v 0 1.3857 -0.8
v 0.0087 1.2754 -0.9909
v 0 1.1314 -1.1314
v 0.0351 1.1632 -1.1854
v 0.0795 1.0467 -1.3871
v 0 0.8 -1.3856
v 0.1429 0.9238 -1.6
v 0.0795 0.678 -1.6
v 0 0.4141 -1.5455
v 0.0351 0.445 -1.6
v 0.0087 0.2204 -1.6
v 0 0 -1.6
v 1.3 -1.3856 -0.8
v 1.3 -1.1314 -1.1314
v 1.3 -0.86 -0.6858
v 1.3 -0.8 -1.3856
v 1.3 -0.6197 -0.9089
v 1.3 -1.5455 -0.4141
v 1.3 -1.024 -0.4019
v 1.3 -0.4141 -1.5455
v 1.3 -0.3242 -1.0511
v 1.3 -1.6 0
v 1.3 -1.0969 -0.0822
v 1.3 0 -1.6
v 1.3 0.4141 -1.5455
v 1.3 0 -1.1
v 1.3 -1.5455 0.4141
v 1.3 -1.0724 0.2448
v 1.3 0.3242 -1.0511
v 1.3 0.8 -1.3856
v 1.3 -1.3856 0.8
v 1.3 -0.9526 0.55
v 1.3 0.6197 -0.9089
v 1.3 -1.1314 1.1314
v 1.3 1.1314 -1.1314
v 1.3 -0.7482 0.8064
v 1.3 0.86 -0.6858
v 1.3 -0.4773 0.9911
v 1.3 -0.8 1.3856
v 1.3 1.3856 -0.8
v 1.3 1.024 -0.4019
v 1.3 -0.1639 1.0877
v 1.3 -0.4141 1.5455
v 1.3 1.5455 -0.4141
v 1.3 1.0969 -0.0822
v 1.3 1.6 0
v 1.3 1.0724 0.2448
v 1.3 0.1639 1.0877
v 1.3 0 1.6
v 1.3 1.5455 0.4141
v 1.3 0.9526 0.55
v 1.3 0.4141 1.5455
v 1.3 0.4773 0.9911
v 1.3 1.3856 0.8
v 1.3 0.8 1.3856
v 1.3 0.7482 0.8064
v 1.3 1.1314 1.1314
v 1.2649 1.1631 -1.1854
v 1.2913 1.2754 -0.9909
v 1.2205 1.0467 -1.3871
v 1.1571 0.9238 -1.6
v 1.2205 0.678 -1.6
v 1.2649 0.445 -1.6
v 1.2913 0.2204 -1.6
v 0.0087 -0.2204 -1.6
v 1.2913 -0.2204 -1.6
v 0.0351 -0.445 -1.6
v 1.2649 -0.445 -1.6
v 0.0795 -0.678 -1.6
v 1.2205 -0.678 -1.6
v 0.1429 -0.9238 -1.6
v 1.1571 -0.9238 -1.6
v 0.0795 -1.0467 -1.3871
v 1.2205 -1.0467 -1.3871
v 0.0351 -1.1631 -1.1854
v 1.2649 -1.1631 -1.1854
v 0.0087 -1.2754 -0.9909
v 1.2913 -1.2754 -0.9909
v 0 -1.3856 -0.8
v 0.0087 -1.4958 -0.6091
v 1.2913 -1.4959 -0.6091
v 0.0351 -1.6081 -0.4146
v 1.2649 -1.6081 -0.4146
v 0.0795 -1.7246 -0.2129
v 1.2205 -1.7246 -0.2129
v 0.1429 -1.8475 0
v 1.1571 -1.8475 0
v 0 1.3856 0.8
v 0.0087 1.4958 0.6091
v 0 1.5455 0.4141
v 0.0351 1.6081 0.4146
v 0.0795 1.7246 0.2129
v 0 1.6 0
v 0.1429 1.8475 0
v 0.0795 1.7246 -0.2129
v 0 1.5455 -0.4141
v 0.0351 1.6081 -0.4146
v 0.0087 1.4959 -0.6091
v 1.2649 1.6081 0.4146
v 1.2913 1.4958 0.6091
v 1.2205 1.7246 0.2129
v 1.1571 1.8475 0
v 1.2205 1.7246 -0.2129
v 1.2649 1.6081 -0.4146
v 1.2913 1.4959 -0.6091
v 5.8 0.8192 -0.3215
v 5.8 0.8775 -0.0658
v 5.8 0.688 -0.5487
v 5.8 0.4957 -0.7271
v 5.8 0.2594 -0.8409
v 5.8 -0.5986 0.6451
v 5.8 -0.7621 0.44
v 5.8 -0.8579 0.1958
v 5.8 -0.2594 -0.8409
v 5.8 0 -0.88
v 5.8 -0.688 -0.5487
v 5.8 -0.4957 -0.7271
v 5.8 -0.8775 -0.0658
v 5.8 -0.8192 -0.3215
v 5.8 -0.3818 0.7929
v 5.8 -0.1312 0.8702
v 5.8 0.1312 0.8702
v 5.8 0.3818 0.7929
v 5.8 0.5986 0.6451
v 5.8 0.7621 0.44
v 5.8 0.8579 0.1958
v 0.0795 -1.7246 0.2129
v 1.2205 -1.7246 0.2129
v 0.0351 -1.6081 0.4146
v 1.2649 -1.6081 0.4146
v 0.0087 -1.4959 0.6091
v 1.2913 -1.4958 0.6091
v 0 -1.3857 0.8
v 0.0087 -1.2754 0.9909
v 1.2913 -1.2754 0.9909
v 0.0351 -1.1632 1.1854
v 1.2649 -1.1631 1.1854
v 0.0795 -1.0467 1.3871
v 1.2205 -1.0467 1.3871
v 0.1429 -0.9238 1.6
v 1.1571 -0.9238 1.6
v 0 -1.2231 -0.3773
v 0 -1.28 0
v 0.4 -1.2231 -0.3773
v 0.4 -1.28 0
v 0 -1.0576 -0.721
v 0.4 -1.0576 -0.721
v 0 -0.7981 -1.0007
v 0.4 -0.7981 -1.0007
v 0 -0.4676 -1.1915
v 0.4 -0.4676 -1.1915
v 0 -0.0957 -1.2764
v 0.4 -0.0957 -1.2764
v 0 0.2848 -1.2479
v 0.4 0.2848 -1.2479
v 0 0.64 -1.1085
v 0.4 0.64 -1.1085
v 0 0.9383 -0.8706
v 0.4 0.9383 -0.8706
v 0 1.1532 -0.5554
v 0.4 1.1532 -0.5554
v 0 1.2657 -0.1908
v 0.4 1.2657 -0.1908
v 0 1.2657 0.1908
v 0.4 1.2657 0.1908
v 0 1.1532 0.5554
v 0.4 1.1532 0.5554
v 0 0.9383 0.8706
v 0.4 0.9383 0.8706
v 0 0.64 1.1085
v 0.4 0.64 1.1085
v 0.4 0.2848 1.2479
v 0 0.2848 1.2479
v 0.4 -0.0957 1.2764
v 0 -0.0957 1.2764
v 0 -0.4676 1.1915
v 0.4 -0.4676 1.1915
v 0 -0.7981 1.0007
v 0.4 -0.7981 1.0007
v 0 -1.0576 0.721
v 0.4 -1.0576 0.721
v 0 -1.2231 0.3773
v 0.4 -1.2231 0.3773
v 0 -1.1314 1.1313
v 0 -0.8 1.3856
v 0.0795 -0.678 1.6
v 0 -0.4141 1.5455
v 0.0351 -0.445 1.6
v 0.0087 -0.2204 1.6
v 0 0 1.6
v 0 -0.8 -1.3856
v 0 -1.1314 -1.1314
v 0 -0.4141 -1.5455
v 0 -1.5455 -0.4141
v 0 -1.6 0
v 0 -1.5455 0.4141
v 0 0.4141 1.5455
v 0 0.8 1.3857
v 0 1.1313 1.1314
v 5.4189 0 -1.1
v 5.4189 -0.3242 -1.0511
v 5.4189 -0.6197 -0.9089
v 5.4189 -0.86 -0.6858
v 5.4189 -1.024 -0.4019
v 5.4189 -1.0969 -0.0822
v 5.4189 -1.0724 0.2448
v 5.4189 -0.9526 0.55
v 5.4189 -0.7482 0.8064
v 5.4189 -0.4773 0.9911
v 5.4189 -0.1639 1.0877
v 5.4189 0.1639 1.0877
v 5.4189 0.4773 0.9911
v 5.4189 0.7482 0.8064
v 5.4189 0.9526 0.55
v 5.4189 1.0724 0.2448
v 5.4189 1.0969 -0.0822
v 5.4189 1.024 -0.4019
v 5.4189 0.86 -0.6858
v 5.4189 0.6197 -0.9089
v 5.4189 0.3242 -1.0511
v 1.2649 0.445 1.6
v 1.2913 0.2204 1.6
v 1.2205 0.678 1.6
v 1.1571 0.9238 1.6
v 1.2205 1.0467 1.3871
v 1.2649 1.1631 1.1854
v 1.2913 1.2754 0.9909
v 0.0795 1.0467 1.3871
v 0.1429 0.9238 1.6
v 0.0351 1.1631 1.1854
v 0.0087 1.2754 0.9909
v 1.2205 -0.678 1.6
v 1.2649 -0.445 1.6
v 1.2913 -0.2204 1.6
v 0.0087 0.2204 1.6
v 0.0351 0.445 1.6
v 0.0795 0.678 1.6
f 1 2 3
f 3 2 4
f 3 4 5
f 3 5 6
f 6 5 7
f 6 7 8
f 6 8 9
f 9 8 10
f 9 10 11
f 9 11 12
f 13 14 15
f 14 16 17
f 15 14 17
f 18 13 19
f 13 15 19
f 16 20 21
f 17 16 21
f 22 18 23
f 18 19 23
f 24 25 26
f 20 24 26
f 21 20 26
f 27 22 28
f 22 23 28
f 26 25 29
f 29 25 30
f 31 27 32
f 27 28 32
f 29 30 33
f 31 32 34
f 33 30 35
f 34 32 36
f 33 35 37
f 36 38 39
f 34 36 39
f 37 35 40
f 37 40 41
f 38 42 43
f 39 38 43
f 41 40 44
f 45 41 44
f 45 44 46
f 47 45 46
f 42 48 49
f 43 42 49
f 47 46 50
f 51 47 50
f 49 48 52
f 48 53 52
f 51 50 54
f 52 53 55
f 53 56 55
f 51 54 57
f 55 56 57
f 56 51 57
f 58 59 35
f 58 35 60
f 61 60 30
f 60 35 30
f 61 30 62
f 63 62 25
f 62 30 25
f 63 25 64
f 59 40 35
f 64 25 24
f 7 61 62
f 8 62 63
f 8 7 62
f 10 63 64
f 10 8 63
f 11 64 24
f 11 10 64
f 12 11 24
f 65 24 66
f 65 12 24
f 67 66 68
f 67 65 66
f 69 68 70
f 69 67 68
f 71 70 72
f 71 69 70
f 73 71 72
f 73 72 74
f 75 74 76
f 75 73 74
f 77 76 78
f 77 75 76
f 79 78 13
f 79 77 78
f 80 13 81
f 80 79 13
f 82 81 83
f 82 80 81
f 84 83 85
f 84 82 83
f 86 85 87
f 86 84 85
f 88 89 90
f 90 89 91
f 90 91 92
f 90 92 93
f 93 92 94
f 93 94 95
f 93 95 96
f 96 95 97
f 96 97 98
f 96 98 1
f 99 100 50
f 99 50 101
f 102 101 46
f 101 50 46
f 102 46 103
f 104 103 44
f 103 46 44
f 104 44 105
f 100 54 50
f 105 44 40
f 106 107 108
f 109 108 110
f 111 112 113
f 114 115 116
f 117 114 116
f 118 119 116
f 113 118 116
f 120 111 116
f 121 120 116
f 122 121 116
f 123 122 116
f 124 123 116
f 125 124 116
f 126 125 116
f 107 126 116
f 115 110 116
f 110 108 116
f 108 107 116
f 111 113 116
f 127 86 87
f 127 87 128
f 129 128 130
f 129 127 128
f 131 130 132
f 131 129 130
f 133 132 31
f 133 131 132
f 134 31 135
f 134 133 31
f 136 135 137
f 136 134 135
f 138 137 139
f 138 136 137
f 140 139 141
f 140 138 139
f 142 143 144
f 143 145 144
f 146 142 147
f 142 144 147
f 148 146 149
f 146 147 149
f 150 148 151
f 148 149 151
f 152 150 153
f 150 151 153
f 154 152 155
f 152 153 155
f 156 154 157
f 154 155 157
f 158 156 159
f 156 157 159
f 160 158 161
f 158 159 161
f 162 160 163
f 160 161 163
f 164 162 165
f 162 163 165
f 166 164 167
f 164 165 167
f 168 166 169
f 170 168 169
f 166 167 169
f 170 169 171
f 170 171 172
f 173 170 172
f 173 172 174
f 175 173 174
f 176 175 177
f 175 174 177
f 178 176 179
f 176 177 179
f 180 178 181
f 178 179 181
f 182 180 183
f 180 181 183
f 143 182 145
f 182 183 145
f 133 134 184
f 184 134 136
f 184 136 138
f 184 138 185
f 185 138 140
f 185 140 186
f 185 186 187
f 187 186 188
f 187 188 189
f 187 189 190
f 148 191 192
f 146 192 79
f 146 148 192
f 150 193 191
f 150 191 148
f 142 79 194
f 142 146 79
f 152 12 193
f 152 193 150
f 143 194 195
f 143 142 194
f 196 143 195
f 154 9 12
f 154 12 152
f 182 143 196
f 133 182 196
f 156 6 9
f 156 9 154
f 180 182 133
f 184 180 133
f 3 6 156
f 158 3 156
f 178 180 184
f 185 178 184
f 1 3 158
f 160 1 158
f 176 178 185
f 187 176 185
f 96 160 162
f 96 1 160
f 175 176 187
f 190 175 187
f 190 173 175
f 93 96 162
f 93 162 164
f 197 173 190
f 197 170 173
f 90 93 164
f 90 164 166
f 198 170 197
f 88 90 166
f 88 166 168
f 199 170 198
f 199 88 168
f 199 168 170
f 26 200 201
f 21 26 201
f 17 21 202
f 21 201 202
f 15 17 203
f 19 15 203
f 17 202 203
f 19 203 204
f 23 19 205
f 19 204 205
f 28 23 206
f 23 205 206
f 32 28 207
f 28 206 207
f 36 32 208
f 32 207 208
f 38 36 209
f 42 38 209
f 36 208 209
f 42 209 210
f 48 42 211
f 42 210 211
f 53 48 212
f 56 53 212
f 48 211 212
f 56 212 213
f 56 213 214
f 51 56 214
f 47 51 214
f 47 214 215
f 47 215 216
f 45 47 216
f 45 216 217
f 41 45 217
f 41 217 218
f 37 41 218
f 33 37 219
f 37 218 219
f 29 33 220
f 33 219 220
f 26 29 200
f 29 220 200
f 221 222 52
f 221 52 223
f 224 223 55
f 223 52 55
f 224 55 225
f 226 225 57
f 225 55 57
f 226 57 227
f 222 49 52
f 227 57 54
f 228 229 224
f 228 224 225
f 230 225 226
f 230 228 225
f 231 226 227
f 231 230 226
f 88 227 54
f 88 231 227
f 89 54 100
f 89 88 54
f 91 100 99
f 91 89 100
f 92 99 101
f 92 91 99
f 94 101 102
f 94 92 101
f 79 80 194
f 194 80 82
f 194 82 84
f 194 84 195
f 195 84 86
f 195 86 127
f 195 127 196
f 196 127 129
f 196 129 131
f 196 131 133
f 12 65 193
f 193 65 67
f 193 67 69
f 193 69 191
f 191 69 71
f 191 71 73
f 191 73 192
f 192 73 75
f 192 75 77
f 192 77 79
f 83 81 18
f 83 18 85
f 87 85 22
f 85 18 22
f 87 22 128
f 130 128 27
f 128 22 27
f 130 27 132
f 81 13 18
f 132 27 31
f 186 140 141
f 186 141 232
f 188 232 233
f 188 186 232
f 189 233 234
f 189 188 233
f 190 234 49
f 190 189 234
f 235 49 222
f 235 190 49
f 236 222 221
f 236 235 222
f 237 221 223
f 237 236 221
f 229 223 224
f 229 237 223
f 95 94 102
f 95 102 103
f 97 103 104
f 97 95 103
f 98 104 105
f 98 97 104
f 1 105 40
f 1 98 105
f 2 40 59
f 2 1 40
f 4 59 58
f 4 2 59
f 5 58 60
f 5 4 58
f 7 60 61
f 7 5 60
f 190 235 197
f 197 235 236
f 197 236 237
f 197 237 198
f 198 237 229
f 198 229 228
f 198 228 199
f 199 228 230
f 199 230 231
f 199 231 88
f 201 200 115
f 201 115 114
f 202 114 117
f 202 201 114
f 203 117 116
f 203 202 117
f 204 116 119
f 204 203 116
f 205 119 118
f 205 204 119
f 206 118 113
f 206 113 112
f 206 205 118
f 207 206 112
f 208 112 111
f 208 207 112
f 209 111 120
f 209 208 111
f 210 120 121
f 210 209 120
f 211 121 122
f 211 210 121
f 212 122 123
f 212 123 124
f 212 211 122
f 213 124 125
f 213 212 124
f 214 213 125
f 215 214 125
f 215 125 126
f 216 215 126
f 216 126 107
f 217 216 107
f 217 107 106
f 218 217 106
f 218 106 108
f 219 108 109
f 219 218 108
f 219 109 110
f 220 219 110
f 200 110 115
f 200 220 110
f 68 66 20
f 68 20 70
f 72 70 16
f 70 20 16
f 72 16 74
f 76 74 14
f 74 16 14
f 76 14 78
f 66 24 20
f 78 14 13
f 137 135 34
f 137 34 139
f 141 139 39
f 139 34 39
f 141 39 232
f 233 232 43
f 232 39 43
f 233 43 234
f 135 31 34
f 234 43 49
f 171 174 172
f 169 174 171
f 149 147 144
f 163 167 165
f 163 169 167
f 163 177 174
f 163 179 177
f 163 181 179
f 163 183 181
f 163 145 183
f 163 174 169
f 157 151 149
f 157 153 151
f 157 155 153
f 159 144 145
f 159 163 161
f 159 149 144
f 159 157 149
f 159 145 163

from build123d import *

# Parameters (mm, degrees)
EXTRUDE1_DEPTH = 1.3
SKETCH4_W      = 0.6
SKETCH4_H      = 1.28
CHAMFER1_SIZE  = 0.22
CHAMFER1_SIZE2 = 0.381051178


with BuildPart() as part:
    # Sketch1 → Revolve1 (revolve)
    with BuildSketch(Plane.XY, mode=Mode.PRIVATE) as revolve1_sk:
        Polygon((0, 0), (0, 1.4), (1.3, 1.4), (1.3, 1.1), (5.8, 1.1), (5.8, 0), align=None)
    revolve(revolve1_sk.sketch.rotate(Axis((13.107885839, 0, 0), (-1, 0, 0)), 90), axis=Axis((13.107885839, 0, 0), (-1, 0, 0)))

    # Sketch2 → Extrude1 (add)
    with BuildSketch(Plane.ZY):
        Polygon((1.6, -0.923760431), (1.6, 0.923760431), (0, 1.847520861), (-1.6, 0.923760431), (-1.6, -0.923760431), (0, -1.847520861), align=None)
    extrude(amount=-EXTRUDE1_DEPTH)

    # Sketch3 → Cut-Revolve2 (revolve, cut)
    with BuildSketch(Plane(origin=(0, 0, 0), x_dir=(1, 0, 0), z_dir=(0, 1, 0))):
        Polygon((-0.923760431, 0), (0.65, 2.725833025), (1.3, 1.6), (1.3, 3.225833025), (-1.023760431, 3.225833025), (-1.023760431, 0), align=None)
    revolve(axis=Axis((0, 0, 0), (-1, 0, 0)), mode=Mode.SUBTRACT)

    # Sketch4 → Cut-Revolve3 (revolve, cut)
    with BuildSketch(Plane.XY, mode=Mode.PRIVATE) as cut_revolve3_sk:
        with Locations((0.1, 0.64)):
            Rectangle(SKETCH4_W, SKETCH4_H)
    revolve(cut_revolve3_sk.sketch.rotate(Axis((0, 0, 0), (1, 0, 0)), 180), axis=Axis((0, 0, 0), (1, 0, 0)), mode=Mode.SUBTRACT)

    # Chamfer1
    chamfer1_edges = [part.edges().sort_by_distance(p)[0] for p in [
        (5.8, 0, 1.1),
    ]]
    chamfer1_side = [part.faces().sort_by_distance(p)[0] for p in [
        (5.8, 0, 0),
    ]]
    chamfer(chamfer1_edges, length=CHAMFER1_SIZE, length2=CHAMFER1_SIZE2, reference=chamfer1_side[0])


solid = part.part
